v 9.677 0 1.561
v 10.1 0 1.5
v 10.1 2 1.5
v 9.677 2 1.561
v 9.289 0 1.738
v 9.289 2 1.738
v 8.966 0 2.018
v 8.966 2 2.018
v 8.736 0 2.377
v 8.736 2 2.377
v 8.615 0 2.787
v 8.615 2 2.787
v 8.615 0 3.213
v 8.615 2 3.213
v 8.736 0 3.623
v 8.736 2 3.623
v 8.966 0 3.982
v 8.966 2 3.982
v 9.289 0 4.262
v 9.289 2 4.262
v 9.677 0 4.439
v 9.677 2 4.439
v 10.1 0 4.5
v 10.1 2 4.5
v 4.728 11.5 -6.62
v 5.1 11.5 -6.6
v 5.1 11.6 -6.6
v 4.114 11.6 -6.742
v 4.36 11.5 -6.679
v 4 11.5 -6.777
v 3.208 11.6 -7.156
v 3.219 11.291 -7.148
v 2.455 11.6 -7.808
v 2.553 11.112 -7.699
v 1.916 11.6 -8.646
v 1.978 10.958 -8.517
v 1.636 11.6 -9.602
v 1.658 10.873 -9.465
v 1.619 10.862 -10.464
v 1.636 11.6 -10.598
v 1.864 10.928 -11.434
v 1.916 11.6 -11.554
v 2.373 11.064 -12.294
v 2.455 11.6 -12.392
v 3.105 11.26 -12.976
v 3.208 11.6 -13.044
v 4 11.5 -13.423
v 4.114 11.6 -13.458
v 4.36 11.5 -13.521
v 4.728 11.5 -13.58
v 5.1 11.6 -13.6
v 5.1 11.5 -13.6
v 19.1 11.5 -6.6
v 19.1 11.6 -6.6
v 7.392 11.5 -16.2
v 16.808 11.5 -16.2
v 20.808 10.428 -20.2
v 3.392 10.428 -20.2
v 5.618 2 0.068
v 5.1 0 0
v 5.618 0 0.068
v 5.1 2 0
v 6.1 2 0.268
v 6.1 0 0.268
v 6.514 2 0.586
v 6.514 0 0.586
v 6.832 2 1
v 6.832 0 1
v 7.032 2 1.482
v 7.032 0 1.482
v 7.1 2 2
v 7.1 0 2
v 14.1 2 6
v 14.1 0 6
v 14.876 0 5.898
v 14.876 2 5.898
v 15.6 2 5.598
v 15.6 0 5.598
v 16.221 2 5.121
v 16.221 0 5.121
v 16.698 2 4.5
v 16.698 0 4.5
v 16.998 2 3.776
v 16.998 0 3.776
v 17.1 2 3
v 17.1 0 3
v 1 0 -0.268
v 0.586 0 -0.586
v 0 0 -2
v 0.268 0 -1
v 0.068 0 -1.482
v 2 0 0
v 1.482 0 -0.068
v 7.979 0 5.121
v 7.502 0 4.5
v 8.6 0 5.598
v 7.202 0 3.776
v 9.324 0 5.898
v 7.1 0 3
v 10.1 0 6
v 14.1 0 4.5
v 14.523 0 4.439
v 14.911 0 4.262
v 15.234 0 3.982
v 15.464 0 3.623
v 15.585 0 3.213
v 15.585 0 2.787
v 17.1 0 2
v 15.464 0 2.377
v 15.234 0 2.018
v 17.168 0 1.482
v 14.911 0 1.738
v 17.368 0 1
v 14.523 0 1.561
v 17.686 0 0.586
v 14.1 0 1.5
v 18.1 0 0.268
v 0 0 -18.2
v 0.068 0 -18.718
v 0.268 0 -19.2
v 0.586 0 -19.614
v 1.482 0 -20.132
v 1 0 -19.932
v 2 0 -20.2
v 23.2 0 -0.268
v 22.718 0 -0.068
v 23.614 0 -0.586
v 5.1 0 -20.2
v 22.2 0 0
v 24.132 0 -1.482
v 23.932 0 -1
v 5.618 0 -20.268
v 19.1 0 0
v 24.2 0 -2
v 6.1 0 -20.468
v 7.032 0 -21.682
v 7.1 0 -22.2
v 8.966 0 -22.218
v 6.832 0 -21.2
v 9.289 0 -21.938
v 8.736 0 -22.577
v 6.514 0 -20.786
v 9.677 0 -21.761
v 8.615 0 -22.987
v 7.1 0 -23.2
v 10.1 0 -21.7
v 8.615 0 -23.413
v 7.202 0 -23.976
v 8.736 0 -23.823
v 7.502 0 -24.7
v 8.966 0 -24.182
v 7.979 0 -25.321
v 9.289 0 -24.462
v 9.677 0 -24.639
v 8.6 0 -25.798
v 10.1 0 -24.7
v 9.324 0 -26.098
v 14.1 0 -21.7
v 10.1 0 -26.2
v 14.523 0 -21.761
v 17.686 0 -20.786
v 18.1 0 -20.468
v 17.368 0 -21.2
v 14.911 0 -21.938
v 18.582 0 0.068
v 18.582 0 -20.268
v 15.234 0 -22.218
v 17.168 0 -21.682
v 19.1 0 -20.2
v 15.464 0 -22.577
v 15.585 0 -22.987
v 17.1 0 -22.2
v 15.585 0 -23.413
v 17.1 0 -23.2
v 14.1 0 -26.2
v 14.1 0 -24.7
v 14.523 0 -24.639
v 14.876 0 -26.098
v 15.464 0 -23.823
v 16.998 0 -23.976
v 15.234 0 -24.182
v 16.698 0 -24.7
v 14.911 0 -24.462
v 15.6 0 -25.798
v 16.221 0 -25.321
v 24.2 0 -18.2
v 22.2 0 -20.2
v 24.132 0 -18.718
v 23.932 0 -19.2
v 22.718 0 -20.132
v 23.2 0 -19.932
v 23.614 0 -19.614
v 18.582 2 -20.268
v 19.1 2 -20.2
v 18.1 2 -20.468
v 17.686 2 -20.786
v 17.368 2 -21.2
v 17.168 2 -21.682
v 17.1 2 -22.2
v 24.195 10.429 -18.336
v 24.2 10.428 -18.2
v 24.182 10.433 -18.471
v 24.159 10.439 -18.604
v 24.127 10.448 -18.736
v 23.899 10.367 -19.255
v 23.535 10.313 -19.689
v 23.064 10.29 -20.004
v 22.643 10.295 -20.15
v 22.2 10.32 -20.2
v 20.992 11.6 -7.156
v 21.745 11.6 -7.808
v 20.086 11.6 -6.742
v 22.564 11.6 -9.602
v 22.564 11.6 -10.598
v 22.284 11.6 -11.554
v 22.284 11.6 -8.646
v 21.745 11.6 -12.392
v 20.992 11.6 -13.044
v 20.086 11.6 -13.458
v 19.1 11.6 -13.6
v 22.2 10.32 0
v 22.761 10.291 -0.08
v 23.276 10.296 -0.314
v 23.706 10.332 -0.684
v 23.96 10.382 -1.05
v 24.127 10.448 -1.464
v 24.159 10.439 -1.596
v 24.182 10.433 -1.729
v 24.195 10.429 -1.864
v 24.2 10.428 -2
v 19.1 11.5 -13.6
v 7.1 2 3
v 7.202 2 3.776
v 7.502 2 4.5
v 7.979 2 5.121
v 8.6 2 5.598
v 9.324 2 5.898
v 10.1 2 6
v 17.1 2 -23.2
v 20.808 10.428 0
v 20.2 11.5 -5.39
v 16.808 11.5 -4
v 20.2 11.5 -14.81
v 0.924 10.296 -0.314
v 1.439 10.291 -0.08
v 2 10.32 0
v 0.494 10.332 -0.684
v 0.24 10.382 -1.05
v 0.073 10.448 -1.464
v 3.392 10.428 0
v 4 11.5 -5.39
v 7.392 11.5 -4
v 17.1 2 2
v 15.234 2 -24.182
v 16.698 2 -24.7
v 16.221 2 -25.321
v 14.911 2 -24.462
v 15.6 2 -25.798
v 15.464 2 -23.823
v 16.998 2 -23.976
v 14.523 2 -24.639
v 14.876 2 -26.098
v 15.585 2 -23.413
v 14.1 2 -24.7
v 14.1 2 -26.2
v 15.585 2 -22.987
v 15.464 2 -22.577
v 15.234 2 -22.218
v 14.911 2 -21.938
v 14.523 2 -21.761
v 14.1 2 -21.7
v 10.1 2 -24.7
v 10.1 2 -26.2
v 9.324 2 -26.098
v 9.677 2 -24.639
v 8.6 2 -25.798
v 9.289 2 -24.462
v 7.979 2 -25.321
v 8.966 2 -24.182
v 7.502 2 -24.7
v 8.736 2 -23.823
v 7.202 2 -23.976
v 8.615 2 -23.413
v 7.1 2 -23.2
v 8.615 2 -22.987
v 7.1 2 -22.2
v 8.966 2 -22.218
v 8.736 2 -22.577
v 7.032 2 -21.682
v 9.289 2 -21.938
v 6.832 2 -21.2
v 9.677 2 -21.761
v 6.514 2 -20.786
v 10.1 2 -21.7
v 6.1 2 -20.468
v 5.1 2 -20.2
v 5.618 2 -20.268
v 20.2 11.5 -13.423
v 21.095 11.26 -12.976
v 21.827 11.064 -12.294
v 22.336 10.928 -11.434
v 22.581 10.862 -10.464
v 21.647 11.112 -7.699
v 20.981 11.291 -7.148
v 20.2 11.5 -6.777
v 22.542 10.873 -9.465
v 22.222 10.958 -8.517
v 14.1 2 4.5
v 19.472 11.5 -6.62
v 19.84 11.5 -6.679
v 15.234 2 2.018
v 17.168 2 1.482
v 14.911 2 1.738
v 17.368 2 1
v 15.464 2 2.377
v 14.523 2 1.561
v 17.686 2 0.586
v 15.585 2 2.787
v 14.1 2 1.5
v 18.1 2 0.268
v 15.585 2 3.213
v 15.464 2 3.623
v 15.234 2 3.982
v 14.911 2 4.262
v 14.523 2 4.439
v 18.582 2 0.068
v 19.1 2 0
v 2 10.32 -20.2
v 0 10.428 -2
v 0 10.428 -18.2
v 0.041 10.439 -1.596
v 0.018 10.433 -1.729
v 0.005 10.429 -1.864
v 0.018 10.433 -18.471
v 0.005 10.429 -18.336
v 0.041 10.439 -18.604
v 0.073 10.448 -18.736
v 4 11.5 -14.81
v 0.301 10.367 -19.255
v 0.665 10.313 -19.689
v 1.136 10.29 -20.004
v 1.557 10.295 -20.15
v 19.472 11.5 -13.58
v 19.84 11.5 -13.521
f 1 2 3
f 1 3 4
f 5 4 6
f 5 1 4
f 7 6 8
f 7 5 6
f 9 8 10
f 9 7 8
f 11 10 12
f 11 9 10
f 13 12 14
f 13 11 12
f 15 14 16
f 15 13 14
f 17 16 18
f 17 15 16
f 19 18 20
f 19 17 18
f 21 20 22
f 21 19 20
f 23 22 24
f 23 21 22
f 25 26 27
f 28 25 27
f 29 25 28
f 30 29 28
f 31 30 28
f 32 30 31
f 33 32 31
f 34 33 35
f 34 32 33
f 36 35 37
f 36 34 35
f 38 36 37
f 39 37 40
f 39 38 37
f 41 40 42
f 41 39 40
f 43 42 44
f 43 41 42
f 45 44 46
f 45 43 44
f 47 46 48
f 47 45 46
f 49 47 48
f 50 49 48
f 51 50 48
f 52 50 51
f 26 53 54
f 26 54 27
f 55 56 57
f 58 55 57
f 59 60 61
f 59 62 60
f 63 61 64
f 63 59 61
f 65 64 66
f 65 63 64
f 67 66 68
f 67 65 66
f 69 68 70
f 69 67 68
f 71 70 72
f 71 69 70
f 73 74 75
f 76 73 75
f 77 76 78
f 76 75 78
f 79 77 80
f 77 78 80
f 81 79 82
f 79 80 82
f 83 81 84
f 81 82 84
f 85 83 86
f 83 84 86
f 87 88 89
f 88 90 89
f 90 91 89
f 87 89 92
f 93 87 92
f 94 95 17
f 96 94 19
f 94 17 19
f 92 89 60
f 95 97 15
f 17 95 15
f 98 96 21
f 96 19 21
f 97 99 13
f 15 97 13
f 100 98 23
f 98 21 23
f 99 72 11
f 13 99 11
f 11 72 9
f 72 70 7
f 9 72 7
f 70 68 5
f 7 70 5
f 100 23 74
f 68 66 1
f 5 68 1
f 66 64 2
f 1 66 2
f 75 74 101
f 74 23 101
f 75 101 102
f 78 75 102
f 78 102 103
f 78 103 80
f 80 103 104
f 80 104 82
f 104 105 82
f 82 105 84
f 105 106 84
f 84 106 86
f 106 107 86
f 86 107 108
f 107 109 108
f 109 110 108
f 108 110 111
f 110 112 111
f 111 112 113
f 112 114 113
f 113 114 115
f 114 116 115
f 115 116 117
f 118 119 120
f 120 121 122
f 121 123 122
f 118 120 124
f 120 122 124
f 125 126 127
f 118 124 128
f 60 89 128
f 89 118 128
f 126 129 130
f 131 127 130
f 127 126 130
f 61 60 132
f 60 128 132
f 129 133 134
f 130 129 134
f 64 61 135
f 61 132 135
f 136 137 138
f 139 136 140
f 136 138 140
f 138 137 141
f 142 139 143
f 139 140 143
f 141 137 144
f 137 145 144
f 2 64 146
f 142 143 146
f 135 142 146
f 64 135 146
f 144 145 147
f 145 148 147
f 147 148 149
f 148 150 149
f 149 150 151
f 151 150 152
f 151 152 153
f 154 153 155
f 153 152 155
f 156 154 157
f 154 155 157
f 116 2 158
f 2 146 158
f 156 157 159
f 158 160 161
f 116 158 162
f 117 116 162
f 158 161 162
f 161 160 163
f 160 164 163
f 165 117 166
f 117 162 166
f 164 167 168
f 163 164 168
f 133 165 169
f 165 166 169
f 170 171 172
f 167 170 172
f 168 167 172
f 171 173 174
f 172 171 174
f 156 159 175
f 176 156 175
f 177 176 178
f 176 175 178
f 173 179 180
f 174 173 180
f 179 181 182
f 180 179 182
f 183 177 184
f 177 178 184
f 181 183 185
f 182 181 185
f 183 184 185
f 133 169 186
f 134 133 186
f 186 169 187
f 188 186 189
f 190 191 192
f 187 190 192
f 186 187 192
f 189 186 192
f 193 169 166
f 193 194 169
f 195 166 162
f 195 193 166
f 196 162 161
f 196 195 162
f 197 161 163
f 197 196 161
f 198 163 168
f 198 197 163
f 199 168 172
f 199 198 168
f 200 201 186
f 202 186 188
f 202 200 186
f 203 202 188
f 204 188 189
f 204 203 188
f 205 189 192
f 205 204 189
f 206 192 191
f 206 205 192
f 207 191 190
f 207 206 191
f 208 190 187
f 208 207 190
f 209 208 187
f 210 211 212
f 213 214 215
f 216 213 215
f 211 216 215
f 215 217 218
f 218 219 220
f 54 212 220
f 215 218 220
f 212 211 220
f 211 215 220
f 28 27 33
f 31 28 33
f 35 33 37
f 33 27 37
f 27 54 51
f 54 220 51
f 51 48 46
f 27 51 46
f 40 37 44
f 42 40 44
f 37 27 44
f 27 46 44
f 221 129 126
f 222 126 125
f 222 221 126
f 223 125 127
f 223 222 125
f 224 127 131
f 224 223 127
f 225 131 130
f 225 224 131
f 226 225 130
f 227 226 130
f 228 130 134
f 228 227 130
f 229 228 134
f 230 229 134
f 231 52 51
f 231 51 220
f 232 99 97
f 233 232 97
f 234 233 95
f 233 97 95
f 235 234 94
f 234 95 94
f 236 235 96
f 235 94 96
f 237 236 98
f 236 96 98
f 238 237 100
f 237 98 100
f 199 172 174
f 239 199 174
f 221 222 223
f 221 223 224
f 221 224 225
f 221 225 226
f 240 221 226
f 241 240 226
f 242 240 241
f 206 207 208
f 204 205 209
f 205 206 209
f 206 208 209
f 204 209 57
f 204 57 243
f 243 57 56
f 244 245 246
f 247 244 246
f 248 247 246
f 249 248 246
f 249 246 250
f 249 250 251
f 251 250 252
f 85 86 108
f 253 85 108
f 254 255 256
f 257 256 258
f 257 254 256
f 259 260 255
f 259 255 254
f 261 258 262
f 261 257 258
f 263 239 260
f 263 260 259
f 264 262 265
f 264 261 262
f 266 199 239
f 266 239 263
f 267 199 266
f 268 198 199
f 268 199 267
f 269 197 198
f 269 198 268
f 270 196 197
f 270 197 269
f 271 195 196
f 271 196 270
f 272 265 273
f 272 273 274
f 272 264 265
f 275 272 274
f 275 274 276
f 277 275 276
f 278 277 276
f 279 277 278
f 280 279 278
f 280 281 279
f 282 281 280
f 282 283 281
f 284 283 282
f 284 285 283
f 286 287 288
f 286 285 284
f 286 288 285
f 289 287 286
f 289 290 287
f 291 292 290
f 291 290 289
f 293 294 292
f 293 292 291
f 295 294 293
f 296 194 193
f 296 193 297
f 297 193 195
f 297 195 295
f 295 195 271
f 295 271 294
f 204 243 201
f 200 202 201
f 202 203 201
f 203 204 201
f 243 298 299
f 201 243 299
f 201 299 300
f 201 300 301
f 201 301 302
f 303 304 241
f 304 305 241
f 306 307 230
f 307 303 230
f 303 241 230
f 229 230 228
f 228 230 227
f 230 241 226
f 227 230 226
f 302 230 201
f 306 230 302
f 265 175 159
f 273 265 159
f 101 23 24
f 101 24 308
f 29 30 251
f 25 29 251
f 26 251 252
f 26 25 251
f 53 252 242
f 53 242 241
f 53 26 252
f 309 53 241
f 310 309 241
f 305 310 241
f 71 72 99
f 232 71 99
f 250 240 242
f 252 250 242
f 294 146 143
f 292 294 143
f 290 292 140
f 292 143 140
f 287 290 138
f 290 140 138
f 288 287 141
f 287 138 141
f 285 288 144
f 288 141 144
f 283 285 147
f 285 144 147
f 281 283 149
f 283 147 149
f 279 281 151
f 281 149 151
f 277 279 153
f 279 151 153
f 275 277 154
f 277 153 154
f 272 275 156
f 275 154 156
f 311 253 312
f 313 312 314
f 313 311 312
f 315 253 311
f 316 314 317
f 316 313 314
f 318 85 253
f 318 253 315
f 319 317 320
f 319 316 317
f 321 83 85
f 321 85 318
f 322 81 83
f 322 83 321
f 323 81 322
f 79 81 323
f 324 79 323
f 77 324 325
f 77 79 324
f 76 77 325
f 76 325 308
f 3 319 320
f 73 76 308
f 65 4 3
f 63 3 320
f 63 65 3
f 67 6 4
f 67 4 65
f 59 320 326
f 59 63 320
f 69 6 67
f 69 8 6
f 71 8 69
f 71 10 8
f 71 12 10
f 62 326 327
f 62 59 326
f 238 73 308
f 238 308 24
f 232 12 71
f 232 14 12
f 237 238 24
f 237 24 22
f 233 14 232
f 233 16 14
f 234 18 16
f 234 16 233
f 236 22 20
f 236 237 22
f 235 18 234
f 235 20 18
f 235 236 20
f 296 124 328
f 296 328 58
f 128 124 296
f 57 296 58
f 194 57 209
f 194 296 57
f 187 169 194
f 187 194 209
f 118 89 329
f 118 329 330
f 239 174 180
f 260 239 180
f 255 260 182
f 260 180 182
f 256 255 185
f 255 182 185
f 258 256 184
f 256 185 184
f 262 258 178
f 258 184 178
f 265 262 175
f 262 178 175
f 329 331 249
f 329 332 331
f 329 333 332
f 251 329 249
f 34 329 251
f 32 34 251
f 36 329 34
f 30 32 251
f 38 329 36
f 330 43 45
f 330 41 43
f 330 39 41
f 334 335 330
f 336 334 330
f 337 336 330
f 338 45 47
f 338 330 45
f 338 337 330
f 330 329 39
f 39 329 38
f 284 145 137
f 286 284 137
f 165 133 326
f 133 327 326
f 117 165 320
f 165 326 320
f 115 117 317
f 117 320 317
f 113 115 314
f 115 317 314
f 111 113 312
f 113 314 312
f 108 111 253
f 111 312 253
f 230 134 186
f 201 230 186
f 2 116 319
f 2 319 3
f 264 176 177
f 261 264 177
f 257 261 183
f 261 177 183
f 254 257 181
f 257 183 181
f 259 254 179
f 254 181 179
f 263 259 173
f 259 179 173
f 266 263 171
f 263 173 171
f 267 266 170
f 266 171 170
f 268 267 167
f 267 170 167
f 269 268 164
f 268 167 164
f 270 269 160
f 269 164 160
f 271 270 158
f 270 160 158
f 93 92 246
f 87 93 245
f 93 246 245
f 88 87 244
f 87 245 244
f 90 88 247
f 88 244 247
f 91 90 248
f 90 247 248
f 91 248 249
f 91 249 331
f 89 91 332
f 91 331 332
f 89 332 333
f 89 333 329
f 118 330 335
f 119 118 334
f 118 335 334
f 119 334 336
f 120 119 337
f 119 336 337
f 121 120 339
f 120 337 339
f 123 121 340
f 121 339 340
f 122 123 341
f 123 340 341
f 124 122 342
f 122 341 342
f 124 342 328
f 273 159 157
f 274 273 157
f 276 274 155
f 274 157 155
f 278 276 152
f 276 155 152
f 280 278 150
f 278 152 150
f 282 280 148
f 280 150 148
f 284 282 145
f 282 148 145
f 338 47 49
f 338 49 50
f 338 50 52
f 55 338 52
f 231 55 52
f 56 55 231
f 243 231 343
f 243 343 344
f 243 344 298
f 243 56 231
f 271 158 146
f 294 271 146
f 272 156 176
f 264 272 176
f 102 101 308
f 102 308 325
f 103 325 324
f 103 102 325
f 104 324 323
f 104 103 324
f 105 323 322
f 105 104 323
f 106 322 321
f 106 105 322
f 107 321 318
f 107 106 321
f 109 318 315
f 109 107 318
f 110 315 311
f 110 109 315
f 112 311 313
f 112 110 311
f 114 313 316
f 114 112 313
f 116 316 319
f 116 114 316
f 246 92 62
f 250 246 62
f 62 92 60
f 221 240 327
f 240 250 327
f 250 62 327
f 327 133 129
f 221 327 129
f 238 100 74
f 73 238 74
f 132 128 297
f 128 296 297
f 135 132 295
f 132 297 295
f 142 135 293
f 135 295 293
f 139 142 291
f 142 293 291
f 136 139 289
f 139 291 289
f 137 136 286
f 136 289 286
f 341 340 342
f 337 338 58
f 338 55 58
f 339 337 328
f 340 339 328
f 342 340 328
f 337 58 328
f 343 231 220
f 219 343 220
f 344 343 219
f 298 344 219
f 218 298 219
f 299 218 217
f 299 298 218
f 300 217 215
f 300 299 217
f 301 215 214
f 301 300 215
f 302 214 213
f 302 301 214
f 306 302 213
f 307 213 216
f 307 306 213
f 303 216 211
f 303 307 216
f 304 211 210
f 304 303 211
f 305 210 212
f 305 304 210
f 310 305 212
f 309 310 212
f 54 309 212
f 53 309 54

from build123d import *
from OCP.BRepFilletAPI import BRepFilletAPI_MakeChamfer

# Parameters (mm, degrees)
SKETCH_1_W       = 24.2
SKETCH_1_H       = 20.2
EXTRUDE_1_DEPTH  = 11.5
EXTRUDE_2_DEPTH  = 2
FILLET_1_R       = 2
EXTRUDE_3_DEPTH  = 0.1
CHAMFER_1_SIZE   = 4
CHAMFER_1_SIZE_2 = 1.07179677
CHAMFER_3_SIZE   = 1
CHAMFER_3_SIZE2  = 2.43937374
FILLET_2_R       = 2


with BuildPart() as part:
    # 草图1 → 凸台-拉伸1 (new body)
    with BuildSketch(Plane(origin=(0, 0, 0), x_dir=(1, 0, 0), z_dir=(0, 1, 0))):
        with Locations((12.1, 10.1)):
            Rectangle(SKETCH_1_W, SKETCH_1_H)
    extrude(amount=EXTRUDE_1_DEPTH)

    # 草图2 → 凸台-拉伸2 (add)
    # profile 1 of 2: a face of its own
    with BuildSketch(Plane.XZ):
        with BuildLine():
            Line((17.1, 0), (7.1, 0))
            Line((7.1, 0), (7.1, 3))
            ThreePointArc((7.1, 3), (7.978679656, 5.121320344), (10.1, 6))
            Line((10.1, 6), (14.1, 6))
            ThreePointArc((14.1, 6), (16.221320344, 5.121320344), (17.1, 3))
            Line((17.1, 3), (17.1, 0))
        make_face()
        with BuildLine():
            Line((14.1, 1.5), (10.1, 1.5))
            ThreePointArc((10.1, 1.5), (8.6, 3), (10.1, 4.5))
            Line((10.1, 4.5), (14.1, 4.5))
            ThreePointArc((14.1, 4.5), (15.6, 3), (14.1, 1.5))
        make_face(mode=Mode.SUBTRACT)
    # profile 2 of 2: a face of its own
    with BuildSketch(Plane.XZ):
        with BuildLine():
            Line((7.1, -23.2), (7.1, -20.2))
            Line((7.1, -20.2), (17.1, -20.2))
            Line((17.1, -20.2), (17.1, -23.2))
            ThreePointArc((17.1, -23.2), (16.221320344, -25.321320344), (14.1, -26.2))
            Line((14.1, -26.2), (10.1, -26.2))
            ThreePointArc((10.1, -26.2), (7.978679656, -25.321320344), (7.1, -23.2))
        make_face()
        with BuildLine():
            Line((14.1, -21.7), (10.1, -21.7))
            ThreePointArc((10.1, -21.7), (8.6, -23.2), (10.1, -24.7))
            Line((10.1, -24.7), (14.1, -24.7))
            ThreePointArc((14.1, -24.7), (15.6, -23.2), (14.1, -21.7))
        make_face(mode=Mode.SUBTRACT)
    extrude(amount=-EXTRUDE_2_DEPTH)

    # 圆角1
    fillet_1_edges = [part.edges().sort_by_distance(p)[0] for p in [
        (7.1, 1, -20.2),
        (17.1, 1, -20.2),
        (17.1, 1, 0),
        (7.1, 1, 0),
    ]]
    fillet(fillet_1_edges, radius=FILLET_1_R)

    # 草图3 → 凸台-拉伸3 (add)
    with BuildSketch(Plane(origin=(0, 11.5, 0), x_dir=(1, 0, 0), z_dir=(0, 1, 0))):
        with BuildLine():
            Line((5.1, 13.6), (19.1, 13.6))
            ThreePointArc((19.1, 13.6), (22.6, 10.1), (19.1, 6.6))
            Line((19.1, 6.6), (5.1, 6.6))
            ThreePointArc((5.1, 6.6), (1.6, 10.1), (5.1, 13.6))
        make_face()
    extrude(amount=EXTRUDE_3_DEPTH)

    # 倒角1
    # the kernel refuses this chamfer: 4, 1.07179677 mm, written as the material it takes off along each edge
    with BuildSketch(Plane(origin=(24.2, 11.5, 10.386886281), x_dir=(-1, 0, 0), z_dir=(0, 0, -1))) as chamfer_1_piece_1_section:
        Polygon((CHAMFER_1_SIZE, 0), (0, -CHAMFER_1_SIZE_2), (0, 0), align=None)
    chamfer_1_piece_1 = extrude(amount=40.973772562, mode=Mode.PRIVATE)
    chamfer_1_piece_1 = chamfer_1_piece_1 - Plane(origin=(19.1, 11.5, -10.1), x_dir=(0, 0, -1), z_dir=(0, -1, 0)) * Cylinder(3.5, 98, mode=Mode.PRIVATE)
    add(chamfer_1_piece_1, mode=Mode.SUBTRACT)
    with BuildSketch(Plane(origin=(34.586886281, 11.5, -20.2), x_dir=(0, 0, 1), z_dir=(-1, 0, 0))) as chamfer_1_piece_2:
        Polygon((CHAMFER_1_SIZE, 0), (0, -CHAMFER_1_SIZE_2), (0, 0), align=None)
    extrude(amount=44.973772562, mode=Mode.SUBTRACT)
    with BuildSketch(Plane(origin=(0, 11.5, -30.586886281), x_dir=(0, -1, 0), z_dir=(0, 0, 1))) as chamfer_1_piece_3_section:
        Polygon((CHAMFER_1_SIZE_2, 0), (0, CHAMFER_1_SIZE), (0, 0), align=None)
    chamfer_1_piece_3 = extrude(amount=40.973772562, mode=Mode.PRIVATE)
    chamfer_1_piece_3 = chamfer_1_piece_3 - Plane(origin=(5.1, 11.5, -10.1), x_dir=(0, 0, 1), z_dir=(0, -1, 0)) * Cylinder(3.5, 98, mode=Mode.PRIVATE)
    add(chamfer_1_piece_3, mode=Mode.SUBTRACT)
    with BuildSketch(Plane(origin=(-10.386886281, 11.5, 0), x_dir=(0, -1, 0), z_dir=(1, 0, 0))) as chamfer_1_piece_4:
        Polygon((CHAMFER_1_SIZE_2, 0), (0, CHAMFER_1_SIZE), (0, 0), align=None)
    extrude(amount=44.973772562, mode=Mode.SUBTRACT)

    # 倒角3: one chamfer whose edges measure the first distance from different faces: ONE call of the kernel's chamfer builder (chamfer() names one face for all edges)
    chamfer_3_edges_1 = [part.edges().sort_by_distance(p)[0] for p in [
        (22.2, 10.964101615, -2),
        (22.2, 10.964101615, -18.2),
    ]]
    chamfer_3_side_1 = [part.faces().sort_by_distance(p)[0] for p in [
        (22.621463638, 10.851170773, -10.1),
    ]]
    chamfer_3_edges_2 = [part.edges().sort_by_distance(p)[0] for p in [
        (2, 10.964101615, -2),
        (2, 10.964101615, -18.2),
    ]]
    chamfer_3_side_2 = [part.faces().sort_by_distance(p)[0] for p in [
        (1.578536362, 10.851170773, -10.1),
    ]]
    chamfer_3 = BRepFilletAPI_MakeChamfer(part.part.solid().wrapped)
    for e in chamfer_3_edges_1:
        chamfer_3.Add(CHAMFER_3_SIZE, CHAMFER_3_SIZE2, e.wrapped, chamfer_3_side_1[0].wrapped)  # the first distance lies on this face
    for e in chamfer_3_edges_2:
        chamfer_3.Add(CHAMFER_3_SIZE, CHAMFER_3_SIZE2, e.wrapped, chamfer_3_side_2[0].wrapped)  # the first distance lies on this face
    add(Compound.cast(chamfer_3.Shape()), mode=Mode.REPLACE)

    # 圆角2
    fillet_2_edges = [part.edges().sort_by_distance(p)[0] for p in [
        (0, 5.081990675, 0),
        (0, 5.081990675, -20.2),
        (24.2, 5.081990675, -20.2),
        (24.2, 5.081990675, 0),
    ]]
    fillet(fillet_2_edges, radius=FILLET_2_R)


solid = part.part
